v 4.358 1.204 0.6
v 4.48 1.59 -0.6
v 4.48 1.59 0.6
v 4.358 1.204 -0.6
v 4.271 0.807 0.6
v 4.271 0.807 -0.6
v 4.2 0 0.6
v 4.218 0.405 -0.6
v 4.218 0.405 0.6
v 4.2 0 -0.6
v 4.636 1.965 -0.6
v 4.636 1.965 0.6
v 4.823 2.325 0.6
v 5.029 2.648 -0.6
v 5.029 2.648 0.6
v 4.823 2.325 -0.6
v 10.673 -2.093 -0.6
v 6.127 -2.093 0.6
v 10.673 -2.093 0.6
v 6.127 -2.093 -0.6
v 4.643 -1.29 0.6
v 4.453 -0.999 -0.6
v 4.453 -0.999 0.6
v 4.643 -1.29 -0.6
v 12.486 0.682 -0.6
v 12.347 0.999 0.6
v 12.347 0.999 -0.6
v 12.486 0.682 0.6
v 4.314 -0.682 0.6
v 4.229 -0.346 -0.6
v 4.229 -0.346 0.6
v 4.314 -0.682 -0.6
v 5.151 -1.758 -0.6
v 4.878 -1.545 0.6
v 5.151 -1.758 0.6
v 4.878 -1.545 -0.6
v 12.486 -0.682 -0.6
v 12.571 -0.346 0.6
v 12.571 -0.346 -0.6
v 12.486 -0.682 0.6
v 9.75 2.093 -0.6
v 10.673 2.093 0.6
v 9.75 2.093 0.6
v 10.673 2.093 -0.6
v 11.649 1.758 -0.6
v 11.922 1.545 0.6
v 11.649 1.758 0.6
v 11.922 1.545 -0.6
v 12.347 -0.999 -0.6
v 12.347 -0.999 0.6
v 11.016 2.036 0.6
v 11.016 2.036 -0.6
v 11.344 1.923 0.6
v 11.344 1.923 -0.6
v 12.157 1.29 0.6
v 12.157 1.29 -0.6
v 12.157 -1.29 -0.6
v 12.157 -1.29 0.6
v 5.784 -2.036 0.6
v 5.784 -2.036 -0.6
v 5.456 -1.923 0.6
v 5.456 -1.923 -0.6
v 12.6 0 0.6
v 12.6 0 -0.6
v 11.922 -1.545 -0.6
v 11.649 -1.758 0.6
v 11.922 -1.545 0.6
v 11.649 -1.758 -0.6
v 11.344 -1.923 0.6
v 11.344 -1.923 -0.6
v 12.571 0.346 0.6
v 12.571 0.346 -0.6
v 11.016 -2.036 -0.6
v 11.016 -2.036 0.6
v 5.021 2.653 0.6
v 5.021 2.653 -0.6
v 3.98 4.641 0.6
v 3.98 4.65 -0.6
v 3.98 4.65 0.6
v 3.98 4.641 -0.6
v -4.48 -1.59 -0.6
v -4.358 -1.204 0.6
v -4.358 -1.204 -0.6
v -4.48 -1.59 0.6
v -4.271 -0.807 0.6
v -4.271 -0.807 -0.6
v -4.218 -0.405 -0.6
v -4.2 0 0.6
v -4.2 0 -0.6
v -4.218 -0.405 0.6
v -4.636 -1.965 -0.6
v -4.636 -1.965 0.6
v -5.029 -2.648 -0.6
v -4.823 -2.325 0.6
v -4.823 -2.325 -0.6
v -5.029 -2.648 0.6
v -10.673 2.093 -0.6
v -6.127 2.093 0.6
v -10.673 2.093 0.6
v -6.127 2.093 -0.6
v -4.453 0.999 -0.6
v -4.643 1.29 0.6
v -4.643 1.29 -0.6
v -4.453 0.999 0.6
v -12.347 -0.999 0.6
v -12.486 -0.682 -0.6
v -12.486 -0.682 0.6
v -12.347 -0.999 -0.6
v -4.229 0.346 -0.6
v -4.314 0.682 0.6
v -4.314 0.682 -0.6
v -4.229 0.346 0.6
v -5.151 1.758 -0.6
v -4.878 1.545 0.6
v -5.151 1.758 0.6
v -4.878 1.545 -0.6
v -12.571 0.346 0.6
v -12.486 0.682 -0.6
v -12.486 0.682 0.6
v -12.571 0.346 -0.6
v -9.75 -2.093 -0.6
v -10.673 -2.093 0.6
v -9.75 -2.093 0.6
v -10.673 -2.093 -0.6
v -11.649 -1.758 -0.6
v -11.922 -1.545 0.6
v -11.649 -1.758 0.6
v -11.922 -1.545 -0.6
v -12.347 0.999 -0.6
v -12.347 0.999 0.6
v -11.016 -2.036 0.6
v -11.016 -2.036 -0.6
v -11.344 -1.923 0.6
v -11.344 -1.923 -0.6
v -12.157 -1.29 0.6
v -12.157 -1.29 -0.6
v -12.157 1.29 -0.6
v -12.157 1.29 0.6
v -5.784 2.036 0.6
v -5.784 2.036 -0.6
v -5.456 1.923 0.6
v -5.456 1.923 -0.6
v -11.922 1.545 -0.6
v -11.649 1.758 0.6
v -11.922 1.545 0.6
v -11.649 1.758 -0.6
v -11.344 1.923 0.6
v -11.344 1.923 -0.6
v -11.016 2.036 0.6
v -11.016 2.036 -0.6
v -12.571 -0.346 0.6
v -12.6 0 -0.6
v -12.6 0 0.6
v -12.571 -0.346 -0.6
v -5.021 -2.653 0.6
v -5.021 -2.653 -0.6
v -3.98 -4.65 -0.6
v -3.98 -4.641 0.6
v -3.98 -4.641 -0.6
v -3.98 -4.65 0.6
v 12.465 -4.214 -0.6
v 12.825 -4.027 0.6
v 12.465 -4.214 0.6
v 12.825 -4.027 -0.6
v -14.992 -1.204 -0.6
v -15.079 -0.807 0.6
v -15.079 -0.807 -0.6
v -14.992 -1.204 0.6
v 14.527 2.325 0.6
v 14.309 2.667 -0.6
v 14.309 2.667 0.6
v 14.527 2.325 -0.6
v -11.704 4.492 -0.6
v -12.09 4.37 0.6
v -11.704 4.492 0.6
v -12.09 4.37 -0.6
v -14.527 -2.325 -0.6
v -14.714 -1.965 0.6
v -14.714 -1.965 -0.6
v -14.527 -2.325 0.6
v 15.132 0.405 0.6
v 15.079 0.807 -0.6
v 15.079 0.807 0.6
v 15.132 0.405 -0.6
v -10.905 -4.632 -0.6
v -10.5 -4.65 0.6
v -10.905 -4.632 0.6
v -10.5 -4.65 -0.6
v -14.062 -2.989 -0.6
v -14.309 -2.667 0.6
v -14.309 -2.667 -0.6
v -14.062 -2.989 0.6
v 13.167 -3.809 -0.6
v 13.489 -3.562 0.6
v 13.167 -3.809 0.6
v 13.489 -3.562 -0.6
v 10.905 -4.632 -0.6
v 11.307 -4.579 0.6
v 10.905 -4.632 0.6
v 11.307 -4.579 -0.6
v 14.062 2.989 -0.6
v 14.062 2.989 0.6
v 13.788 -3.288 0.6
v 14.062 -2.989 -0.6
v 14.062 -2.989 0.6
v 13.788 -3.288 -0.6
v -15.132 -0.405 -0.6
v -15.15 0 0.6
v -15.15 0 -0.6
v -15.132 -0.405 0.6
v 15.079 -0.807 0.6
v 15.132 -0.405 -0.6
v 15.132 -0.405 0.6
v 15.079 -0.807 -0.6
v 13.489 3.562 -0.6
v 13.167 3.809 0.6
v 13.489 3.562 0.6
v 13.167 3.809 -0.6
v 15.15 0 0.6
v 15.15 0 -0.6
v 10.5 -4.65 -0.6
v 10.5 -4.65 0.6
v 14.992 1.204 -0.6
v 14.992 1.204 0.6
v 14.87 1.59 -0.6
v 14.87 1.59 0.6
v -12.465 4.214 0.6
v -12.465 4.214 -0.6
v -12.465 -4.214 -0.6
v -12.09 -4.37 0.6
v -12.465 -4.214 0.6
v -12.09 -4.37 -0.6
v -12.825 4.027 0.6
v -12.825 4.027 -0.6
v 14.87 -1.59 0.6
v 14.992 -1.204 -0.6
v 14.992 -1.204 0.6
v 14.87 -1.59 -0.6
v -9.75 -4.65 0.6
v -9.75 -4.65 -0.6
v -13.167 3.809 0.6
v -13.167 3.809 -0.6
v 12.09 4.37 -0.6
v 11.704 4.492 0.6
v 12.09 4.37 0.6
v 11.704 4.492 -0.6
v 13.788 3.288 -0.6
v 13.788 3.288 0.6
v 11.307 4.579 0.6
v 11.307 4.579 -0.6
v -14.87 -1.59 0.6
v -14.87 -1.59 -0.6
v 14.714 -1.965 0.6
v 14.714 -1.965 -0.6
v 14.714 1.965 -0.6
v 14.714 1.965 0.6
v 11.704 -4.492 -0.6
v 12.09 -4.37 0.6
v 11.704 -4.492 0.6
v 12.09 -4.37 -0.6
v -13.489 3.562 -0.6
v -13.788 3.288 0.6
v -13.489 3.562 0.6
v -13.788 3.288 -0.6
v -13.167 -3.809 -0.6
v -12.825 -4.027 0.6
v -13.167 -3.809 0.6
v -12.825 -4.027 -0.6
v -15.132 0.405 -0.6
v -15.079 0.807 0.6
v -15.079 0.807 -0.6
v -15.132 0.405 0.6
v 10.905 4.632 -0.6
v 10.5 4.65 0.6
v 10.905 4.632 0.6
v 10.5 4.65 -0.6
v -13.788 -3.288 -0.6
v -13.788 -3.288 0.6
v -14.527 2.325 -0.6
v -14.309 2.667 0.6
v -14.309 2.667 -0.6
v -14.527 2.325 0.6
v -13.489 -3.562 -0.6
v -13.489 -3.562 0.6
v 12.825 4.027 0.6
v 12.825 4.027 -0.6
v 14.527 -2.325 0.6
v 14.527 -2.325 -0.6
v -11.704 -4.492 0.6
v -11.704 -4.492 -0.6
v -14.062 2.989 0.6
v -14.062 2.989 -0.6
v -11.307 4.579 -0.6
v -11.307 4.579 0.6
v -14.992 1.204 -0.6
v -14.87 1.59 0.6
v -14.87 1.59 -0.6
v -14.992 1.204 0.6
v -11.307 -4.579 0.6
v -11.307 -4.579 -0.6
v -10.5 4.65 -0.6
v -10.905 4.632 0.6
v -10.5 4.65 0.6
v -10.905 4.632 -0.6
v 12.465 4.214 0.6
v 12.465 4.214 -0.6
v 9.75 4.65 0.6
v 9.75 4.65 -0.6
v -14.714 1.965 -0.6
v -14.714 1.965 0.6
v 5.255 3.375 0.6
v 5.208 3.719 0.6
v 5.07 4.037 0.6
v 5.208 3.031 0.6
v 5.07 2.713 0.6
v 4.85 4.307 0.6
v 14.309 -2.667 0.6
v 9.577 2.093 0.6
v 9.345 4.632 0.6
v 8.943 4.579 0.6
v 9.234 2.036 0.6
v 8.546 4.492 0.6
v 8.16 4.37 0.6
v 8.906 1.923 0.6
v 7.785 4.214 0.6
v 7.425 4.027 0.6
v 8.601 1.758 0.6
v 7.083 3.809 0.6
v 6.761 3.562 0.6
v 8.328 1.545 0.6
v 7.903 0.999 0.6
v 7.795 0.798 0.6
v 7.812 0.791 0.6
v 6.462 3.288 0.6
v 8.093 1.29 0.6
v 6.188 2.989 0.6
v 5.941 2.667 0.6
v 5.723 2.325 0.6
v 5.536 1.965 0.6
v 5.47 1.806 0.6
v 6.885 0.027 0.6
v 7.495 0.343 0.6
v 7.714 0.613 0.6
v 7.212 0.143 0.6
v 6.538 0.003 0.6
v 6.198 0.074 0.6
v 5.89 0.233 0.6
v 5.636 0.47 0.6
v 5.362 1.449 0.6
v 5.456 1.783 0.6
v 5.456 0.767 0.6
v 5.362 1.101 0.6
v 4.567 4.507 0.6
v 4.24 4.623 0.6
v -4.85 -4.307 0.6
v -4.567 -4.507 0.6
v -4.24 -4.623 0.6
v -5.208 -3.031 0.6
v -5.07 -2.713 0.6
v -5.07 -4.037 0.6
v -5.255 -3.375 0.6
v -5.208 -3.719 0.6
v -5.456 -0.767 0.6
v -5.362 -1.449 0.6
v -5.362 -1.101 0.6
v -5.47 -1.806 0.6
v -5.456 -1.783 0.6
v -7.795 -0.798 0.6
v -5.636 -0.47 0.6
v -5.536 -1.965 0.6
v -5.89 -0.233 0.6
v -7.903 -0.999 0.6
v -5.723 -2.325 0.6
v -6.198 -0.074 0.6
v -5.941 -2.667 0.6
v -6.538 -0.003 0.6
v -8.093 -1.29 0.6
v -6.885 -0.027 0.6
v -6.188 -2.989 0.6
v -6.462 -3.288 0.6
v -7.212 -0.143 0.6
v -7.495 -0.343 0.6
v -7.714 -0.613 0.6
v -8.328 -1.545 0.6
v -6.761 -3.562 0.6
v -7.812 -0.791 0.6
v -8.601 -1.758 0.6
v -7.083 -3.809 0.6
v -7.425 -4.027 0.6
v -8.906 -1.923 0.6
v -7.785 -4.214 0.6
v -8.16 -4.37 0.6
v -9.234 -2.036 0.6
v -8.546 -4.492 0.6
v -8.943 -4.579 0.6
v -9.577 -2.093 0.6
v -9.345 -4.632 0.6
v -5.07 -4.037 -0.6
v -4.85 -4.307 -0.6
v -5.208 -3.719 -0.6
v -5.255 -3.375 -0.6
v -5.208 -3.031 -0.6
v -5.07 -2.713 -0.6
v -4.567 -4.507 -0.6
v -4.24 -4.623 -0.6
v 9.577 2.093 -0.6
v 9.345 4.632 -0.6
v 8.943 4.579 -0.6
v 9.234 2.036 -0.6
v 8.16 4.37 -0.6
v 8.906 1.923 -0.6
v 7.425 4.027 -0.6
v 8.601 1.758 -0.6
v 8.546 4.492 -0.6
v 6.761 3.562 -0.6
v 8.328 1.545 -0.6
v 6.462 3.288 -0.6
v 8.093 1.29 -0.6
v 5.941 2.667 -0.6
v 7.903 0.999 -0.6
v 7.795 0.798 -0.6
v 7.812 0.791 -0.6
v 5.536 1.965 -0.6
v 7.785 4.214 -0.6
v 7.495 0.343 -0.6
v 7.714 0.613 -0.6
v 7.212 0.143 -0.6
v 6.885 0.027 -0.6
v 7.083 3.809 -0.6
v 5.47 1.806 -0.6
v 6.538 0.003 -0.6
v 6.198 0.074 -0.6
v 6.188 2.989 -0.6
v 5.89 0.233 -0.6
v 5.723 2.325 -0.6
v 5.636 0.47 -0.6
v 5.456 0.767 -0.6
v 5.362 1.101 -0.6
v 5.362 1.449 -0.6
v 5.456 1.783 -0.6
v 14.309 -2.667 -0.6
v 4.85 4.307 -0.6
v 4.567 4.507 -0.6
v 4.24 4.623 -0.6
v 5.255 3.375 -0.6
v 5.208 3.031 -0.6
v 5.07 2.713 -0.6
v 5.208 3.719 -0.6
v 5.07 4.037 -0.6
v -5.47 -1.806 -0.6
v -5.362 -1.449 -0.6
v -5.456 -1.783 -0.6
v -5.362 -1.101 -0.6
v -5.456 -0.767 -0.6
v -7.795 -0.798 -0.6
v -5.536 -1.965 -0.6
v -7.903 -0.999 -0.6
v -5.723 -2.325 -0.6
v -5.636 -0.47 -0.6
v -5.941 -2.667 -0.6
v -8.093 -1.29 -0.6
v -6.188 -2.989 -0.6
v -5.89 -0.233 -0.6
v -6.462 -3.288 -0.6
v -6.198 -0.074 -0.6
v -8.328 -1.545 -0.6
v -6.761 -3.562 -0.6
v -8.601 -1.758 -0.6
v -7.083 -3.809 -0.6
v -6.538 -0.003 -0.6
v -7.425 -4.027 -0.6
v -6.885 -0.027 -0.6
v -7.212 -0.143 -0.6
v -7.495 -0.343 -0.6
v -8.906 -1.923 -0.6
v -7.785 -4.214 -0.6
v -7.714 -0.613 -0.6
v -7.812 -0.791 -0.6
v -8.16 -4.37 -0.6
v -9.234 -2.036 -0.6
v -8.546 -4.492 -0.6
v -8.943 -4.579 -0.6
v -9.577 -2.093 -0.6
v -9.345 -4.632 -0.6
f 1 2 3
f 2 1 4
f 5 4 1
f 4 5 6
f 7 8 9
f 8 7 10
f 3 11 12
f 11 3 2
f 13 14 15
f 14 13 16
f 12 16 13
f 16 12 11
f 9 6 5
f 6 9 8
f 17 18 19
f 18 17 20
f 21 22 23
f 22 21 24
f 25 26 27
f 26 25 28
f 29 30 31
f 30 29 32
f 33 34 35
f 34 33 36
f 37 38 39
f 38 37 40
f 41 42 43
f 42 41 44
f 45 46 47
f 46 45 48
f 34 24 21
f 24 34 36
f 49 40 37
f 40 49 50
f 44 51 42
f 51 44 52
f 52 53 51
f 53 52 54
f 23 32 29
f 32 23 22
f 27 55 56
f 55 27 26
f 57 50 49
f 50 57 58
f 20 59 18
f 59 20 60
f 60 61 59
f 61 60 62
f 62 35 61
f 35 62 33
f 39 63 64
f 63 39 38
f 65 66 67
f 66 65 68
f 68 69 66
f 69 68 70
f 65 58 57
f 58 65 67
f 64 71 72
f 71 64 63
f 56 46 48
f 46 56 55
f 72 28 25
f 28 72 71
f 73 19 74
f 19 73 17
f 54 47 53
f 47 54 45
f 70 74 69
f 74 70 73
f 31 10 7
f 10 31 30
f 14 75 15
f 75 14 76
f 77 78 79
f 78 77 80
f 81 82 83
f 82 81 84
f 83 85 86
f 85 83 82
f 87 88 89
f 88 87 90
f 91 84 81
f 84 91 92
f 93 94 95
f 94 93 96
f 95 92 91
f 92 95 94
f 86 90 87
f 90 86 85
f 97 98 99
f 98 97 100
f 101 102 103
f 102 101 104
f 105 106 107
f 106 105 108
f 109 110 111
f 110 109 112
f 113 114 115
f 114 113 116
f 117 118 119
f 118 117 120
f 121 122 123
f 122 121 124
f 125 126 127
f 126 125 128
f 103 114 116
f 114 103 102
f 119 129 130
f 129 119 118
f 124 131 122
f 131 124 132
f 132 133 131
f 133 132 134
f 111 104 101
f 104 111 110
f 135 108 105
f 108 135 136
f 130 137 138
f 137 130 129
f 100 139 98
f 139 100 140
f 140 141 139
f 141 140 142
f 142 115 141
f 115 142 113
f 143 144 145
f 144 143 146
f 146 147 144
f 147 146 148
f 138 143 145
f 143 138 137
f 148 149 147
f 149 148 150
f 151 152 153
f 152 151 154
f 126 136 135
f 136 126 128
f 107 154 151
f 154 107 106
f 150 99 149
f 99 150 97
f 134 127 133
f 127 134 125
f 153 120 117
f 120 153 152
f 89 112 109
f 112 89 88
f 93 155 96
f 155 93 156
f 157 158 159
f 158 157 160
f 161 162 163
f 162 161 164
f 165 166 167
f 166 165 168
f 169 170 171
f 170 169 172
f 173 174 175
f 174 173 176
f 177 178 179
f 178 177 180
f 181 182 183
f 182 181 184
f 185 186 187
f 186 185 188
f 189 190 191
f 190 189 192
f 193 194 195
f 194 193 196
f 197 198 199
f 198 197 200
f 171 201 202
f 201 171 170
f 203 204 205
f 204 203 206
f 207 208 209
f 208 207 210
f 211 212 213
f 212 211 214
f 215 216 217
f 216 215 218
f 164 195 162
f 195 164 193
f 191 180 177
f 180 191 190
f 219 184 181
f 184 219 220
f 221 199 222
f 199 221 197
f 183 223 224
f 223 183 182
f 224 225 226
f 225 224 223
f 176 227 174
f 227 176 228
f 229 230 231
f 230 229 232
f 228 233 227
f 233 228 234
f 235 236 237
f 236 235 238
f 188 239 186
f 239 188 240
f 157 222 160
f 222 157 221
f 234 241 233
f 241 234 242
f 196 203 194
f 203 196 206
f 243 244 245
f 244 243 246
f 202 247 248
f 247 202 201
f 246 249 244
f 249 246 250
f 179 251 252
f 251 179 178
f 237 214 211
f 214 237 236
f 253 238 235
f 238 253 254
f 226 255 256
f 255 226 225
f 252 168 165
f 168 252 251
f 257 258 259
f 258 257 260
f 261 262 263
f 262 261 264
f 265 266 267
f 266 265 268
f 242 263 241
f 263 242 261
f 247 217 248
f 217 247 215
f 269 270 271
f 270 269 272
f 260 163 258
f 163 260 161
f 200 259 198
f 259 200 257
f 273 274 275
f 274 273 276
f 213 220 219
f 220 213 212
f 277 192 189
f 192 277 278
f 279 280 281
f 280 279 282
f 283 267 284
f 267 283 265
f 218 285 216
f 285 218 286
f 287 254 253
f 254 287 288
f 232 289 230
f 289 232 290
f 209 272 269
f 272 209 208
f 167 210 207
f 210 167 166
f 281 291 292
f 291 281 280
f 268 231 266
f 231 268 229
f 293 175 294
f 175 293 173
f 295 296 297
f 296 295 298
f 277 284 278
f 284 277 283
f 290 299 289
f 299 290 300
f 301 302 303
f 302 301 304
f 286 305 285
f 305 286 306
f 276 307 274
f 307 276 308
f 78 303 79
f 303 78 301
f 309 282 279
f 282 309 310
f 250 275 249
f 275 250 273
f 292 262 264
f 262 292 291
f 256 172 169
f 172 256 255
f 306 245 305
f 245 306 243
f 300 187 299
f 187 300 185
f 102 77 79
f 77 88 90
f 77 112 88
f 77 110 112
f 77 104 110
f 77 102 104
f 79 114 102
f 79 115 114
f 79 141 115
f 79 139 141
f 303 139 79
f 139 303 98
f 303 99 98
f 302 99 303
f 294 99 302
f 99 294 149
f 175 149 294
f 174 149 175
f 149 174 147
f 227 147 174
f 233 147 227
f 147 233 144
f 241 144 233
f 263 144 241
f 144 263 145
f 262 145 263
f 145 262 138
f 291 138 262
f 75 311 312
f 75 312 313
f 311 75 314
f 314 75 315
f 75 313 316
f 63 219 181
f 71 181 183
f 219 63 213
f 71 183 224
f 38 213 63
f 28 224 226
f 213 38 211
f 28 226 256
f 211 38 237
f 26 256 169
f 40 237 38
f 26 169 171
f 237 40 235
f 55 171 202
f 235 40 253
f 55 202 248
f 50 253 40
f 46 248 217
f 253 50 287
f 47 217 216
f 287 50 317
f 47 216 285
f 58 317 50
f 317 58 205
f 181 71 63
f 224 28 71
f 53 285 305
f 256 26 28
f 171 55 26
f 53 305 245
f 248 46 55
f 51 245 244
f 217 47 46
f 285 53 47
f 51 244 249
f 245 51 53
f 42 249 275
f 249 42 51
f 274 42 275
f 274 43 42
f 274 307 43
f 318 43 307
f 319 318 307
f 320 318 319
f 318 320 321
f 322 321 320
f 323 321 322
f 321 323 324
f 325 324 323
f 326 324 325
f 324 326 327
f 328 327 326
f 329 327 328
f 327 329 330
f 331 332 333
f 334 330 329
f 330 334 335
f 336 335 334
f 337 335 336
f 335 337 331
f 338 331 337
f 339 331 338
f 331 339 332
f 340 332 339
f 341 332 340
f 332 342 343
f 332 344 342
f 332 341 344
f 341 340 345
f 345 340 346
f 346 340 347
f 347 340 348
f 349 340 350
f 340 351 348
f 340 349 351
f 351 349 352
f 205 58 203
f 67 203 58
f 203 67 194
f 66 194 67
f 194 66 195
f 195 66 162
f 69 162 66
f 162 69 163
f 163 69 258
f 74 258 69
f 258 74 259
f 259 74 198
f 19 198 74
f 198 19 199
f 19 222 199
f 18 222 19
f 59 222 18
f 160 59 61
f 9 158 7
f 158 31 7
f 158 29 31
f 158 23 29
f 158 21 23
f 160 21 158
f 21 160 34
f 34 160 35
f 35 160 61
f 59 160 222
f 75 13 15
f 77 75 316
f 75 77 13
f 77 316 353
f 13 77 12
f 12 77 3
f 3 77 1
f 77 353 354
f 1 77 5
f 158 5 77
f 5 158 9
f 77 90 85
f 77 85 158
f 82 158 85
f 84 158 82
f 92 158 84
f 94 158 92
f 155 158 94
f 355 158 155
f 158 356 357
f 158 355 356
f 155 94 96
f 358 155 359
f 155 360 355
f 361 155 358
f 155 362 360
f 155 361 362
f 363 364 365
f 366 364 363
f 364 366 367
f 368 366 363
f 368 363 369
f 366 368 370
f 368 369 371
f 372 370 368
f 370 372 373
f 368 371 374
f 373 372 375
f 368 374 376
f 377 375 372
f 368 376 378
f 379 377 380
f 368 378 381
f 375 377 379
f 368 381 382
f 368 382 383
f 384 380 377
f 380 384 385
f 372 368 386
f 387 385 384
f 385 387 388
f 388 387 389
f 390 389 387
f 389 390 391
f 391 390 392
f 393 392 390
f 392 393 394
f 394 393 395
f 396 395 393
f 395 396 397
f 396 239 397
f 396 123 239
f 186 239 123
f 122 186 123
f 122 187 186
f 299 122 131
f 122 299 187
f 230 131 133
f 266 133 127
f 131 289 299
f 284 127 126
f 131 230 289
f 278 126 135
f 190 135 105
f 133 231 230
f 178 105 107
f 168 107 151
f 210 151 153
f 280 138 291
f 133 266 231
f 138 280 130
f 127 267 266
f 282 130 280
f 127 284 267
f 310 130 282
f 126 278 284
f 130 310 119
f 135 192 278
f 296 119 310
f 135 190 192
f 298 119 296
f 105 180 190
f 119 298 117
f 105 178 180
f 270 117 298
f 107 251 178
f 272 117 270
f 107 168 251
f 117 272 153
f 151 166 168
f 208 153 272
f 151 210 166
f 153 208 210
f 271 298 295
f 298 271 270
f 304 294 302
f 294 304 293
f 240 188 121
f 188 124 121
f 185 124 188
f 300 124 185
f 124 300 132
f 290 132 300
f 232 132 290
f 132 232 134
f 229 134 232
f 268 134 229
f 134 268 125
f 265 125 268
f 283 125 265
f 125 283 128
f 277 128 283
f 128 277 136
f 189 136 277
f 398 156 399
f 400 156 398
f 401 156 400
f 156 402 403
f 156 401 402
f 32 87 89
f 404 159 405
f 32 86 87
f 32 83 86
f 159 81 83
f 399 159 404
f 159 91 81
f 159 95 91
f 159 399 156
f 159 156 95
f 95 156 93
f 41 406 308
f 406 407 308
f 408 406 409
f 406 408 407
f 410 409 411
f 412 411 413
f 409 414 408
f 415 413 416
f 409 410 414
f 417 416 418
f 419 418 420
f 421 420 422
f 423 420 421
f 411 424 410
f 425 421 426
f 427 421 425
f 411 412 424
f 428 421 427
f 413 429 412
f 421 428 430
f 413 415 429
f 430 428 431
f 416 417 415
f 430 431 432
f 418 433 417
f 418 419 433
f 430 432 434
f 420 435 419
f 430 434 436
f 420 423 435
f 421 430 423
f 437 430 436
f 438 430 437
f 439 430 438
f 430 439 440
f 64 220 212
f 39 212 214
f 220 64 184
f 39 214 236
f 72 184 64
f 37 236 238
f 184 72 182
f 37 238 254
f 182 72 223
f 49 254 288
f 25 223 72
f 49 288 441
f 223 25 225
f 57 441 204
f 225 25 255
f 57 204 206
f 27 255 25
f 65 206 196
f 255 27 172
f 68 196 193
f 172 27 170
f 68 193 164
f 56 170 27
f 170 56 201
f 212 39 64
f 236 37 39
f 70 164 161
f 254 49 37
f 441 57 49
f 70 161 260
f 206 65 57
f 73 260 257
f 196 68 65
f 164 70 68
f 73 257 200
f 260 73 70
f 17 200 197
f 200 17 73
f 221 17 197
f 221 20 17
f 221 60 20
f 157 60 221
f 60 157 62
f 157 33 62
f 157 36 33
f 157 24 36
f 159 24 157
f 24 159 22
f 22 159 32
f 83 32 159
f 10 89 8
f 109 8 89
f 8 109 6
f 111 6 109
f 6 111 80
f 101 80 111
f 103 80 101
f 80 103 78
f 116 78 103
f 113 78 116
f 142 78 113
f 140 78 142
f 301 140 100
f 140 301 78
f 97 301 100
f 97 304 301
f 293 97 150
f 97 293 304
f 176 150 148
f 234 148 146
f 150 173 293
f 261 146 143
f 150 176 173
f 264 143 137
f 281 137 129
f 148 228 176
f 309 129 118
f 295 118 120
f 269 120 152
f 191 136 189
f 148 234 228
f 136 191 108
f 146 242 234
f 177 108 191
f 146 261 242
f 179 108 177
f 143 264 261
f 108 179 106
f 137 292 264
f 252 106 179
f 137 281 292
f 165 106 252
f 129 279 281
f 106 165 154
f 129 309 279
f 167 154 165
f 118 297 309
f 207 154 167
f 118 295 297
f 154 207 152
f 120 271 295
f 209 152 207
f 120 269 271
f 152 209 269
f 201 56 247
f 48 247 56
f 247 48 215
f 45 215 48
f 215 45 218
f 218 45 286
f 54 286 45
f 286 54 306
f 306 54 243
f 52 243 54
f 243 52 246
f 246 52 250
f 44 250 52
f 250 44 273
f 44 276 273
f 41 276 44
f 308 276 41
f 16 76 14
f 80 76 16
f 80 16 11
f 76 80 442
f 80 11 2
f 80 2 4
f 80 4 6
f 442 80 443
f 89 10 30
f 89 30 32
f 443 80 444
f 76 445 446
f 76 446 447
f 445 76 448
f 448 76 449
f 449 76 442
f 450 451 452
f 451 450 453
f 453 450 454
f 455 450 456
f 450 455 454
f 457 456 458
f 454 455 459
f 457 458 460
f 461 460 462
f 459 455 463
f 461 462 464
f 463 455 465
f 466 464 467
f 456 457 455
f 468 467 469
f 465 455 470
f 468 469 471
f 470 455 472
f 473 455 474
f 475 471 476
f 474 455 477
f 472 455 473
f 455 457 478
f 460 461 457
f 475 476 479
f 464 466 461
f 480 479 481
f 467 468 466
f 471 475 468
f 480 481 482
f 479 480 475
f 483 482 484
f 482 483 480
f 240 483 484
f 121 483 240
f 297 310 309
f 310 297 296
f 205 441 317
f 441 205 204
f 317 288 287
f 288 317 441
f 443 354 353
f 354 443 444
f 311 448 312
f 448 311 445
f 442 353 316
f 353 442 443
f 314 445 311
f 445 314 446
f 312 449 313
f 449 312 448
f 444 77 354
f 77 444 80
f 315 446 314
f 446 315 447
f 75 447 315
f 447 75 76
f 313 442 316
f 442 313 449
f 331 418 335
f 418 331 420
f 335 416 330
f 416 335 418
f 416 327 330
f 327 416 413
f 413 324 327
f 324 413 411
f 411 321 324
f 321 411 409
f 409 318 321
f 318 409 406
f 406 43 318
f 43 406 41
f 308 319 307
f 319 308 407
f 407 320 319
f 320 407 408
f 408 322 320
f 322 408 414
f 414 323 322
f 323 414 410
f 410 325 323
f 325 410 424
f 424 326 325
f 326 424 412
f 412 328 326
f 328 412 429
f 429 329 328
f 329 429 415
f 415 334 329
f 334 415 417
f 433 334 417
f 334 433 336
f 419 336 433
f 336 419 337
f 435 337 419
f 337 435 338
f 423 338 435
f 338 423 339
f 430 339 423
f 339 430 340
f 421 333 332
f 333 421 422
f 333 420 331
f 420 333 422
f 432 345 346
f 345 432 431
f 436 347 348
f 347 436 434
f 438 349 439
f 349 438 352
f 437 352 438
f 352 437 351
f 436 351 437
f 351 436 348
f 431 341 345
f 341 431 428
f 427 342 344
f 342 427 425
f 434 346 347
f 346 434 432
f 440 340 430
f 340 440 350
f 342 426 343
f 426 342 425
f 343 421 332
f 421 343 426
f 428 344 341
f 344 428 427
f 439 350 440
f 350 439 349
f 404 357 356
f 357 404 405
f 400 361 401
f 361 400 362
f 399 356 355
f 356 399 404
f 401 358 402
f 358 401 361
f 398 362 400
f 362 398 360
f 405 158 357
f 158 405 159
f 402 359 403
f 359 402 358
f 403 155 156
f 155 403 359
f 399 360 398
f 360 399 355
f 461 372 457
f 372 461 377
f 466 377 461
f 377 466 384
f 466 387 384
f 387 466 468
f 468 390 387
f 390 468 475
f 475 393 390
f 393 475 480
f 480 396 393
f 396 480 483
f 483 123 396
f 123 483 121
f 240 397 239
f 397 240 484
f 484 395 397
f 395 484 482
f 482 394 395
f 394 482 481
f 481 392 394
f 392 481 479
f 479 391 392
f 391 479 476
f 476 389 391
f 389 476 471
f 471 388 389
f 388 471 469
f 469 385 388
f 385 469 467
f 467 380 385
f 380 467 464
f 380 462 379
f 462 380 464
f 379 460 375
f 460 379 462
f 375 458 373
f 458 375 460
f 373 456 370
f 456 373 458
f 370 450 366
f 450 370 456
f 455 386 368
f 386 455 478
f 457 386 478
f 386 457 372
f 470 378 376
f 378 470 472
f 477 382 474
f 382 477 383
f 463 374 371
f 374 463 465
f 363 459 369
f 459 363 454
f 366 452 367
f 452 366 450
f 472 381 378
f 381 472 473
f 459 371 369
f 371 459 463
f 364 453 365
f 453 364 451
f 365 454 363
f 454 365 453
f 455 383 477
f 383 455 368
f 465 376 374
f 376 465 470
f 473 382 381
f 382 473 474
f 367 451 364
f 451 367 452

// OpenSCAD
thickness = 1.2;
length = 30.3;
gap_size = 0.9;
desired_hook_thickness = 2.55;
desired_width = 9.3;

/* [Hidden] */
FA = 5;
FS = 0.35;

// Do thickness2 bounds
max_thickness2 = (length-9*gap_size)/5;
if(desired_hook_thickness > max_thickness2)
  echo(str("Warning: Hook thickness can be at most ", max_thickness2, ", so using this instead!"));
thickness2 = min(desired_hook_thickness, max_thickness2);

// Do width bounds
max_width = (length + thickness2-3*gap_size)/3;
min_width = 2*(thickness2 + gap_size);
if(desired_width > max_width)
  echo(str("Warning: Width can be at most ", max_width, ", so using this instead!"));
if(desired_width < min_width)
  echo(str("Warning: Width can be at least ", min_width, ", so using this instead!"));
width = min(max(min_width, desired_width), max_width);

// Compute some things
c2c = length - width;
icr = width/2 - thickness2;
i3rd = (length - 2*thickness2) / 3;
er = thickness2/2;
df = sqrt(pow(width/2+er, 2) - pow(width/2-er, 2));
ed = sqrt(pow(width/2 - thickness2/2, 2) - pow(thickness2/2, 2));

difference()
{
  hull()
  {
    translate([c2c/2, 0, 0])
      cylinder(thickness, width/2, width/2, true, $fa = FA, $fs = FS);
    
    translate([-c2c/2, 0, 0])
      cylinder(thickness, width/2, width/2, true, $fa = FA, $fs = FS);
  }
  cutOut();
  rotate(180)cutOut();
}

addBack();
rotate(180)addBack();


module cutOut()
{
  hull()
  {
    translate([c2c/2, 0, 0])
      cylinder(thickness+1, icr, icr, true, $fa = FA, $fs = FS);
    translate([i3rd/2 + icr, 0, 0])
      cylinder(thickness+1, icr, icr, true, $fa = FA, $fs = FS);
  }

  translate([width/2 + i3rd/2, 0, 0])
  {
    intersection()
    {
      cylinder(thickness+1, width/2, width/2, true, $fa = FA, $fs = FS);
      translate([-width/2-1, 0, -thickness/2-0.5])
        cube([width/2+1, width/2+1, thickness+1]);
    }
  }

  translate([width/2 + i3rd/2-df, width/2 - er, 0])
  {
    linear_extrude(height=thickness+1, center=true)
      polygon(points=[[0, er+1], [0, 0], [df, -width/2+er], [df+gap_size, er-thickness2], [df+gap_size,er+1]]);
  }
}

module addBack()
{
  translate([width/2 + i3rd/2-df, width/2 - er, 0])
    cylinder(thickness, er, er, true, $fa = FA, $fs = FS);

  translate([width/2 + i3rd/2+gap_size, 0, 0])
  linear_extrude(height=thickness, center=true)
  union()
  {
    difference()
    {
      intersection()
      {
        circle(width/2, true, $fa = FA, $fs = FS);
        translate([-width/2-1, 0])
          square(width/2+1, width/2+1);
      }
      circle(icr, true, $fa = FA, $fs = FS);
      polygon(points=[[0,0], [-ed*3, thickness2*1.5], [-sqrt(ed*ed*4 +  thickness2*thickness2),0]]);
    }
  }
  translate([width/2 + i3rd/2+gap_size-ed, thickness2/2, 0])
    cylinder(thickness, thickness2/2, thickness2/2, true, $fa = FA, $fs = FS);
}
